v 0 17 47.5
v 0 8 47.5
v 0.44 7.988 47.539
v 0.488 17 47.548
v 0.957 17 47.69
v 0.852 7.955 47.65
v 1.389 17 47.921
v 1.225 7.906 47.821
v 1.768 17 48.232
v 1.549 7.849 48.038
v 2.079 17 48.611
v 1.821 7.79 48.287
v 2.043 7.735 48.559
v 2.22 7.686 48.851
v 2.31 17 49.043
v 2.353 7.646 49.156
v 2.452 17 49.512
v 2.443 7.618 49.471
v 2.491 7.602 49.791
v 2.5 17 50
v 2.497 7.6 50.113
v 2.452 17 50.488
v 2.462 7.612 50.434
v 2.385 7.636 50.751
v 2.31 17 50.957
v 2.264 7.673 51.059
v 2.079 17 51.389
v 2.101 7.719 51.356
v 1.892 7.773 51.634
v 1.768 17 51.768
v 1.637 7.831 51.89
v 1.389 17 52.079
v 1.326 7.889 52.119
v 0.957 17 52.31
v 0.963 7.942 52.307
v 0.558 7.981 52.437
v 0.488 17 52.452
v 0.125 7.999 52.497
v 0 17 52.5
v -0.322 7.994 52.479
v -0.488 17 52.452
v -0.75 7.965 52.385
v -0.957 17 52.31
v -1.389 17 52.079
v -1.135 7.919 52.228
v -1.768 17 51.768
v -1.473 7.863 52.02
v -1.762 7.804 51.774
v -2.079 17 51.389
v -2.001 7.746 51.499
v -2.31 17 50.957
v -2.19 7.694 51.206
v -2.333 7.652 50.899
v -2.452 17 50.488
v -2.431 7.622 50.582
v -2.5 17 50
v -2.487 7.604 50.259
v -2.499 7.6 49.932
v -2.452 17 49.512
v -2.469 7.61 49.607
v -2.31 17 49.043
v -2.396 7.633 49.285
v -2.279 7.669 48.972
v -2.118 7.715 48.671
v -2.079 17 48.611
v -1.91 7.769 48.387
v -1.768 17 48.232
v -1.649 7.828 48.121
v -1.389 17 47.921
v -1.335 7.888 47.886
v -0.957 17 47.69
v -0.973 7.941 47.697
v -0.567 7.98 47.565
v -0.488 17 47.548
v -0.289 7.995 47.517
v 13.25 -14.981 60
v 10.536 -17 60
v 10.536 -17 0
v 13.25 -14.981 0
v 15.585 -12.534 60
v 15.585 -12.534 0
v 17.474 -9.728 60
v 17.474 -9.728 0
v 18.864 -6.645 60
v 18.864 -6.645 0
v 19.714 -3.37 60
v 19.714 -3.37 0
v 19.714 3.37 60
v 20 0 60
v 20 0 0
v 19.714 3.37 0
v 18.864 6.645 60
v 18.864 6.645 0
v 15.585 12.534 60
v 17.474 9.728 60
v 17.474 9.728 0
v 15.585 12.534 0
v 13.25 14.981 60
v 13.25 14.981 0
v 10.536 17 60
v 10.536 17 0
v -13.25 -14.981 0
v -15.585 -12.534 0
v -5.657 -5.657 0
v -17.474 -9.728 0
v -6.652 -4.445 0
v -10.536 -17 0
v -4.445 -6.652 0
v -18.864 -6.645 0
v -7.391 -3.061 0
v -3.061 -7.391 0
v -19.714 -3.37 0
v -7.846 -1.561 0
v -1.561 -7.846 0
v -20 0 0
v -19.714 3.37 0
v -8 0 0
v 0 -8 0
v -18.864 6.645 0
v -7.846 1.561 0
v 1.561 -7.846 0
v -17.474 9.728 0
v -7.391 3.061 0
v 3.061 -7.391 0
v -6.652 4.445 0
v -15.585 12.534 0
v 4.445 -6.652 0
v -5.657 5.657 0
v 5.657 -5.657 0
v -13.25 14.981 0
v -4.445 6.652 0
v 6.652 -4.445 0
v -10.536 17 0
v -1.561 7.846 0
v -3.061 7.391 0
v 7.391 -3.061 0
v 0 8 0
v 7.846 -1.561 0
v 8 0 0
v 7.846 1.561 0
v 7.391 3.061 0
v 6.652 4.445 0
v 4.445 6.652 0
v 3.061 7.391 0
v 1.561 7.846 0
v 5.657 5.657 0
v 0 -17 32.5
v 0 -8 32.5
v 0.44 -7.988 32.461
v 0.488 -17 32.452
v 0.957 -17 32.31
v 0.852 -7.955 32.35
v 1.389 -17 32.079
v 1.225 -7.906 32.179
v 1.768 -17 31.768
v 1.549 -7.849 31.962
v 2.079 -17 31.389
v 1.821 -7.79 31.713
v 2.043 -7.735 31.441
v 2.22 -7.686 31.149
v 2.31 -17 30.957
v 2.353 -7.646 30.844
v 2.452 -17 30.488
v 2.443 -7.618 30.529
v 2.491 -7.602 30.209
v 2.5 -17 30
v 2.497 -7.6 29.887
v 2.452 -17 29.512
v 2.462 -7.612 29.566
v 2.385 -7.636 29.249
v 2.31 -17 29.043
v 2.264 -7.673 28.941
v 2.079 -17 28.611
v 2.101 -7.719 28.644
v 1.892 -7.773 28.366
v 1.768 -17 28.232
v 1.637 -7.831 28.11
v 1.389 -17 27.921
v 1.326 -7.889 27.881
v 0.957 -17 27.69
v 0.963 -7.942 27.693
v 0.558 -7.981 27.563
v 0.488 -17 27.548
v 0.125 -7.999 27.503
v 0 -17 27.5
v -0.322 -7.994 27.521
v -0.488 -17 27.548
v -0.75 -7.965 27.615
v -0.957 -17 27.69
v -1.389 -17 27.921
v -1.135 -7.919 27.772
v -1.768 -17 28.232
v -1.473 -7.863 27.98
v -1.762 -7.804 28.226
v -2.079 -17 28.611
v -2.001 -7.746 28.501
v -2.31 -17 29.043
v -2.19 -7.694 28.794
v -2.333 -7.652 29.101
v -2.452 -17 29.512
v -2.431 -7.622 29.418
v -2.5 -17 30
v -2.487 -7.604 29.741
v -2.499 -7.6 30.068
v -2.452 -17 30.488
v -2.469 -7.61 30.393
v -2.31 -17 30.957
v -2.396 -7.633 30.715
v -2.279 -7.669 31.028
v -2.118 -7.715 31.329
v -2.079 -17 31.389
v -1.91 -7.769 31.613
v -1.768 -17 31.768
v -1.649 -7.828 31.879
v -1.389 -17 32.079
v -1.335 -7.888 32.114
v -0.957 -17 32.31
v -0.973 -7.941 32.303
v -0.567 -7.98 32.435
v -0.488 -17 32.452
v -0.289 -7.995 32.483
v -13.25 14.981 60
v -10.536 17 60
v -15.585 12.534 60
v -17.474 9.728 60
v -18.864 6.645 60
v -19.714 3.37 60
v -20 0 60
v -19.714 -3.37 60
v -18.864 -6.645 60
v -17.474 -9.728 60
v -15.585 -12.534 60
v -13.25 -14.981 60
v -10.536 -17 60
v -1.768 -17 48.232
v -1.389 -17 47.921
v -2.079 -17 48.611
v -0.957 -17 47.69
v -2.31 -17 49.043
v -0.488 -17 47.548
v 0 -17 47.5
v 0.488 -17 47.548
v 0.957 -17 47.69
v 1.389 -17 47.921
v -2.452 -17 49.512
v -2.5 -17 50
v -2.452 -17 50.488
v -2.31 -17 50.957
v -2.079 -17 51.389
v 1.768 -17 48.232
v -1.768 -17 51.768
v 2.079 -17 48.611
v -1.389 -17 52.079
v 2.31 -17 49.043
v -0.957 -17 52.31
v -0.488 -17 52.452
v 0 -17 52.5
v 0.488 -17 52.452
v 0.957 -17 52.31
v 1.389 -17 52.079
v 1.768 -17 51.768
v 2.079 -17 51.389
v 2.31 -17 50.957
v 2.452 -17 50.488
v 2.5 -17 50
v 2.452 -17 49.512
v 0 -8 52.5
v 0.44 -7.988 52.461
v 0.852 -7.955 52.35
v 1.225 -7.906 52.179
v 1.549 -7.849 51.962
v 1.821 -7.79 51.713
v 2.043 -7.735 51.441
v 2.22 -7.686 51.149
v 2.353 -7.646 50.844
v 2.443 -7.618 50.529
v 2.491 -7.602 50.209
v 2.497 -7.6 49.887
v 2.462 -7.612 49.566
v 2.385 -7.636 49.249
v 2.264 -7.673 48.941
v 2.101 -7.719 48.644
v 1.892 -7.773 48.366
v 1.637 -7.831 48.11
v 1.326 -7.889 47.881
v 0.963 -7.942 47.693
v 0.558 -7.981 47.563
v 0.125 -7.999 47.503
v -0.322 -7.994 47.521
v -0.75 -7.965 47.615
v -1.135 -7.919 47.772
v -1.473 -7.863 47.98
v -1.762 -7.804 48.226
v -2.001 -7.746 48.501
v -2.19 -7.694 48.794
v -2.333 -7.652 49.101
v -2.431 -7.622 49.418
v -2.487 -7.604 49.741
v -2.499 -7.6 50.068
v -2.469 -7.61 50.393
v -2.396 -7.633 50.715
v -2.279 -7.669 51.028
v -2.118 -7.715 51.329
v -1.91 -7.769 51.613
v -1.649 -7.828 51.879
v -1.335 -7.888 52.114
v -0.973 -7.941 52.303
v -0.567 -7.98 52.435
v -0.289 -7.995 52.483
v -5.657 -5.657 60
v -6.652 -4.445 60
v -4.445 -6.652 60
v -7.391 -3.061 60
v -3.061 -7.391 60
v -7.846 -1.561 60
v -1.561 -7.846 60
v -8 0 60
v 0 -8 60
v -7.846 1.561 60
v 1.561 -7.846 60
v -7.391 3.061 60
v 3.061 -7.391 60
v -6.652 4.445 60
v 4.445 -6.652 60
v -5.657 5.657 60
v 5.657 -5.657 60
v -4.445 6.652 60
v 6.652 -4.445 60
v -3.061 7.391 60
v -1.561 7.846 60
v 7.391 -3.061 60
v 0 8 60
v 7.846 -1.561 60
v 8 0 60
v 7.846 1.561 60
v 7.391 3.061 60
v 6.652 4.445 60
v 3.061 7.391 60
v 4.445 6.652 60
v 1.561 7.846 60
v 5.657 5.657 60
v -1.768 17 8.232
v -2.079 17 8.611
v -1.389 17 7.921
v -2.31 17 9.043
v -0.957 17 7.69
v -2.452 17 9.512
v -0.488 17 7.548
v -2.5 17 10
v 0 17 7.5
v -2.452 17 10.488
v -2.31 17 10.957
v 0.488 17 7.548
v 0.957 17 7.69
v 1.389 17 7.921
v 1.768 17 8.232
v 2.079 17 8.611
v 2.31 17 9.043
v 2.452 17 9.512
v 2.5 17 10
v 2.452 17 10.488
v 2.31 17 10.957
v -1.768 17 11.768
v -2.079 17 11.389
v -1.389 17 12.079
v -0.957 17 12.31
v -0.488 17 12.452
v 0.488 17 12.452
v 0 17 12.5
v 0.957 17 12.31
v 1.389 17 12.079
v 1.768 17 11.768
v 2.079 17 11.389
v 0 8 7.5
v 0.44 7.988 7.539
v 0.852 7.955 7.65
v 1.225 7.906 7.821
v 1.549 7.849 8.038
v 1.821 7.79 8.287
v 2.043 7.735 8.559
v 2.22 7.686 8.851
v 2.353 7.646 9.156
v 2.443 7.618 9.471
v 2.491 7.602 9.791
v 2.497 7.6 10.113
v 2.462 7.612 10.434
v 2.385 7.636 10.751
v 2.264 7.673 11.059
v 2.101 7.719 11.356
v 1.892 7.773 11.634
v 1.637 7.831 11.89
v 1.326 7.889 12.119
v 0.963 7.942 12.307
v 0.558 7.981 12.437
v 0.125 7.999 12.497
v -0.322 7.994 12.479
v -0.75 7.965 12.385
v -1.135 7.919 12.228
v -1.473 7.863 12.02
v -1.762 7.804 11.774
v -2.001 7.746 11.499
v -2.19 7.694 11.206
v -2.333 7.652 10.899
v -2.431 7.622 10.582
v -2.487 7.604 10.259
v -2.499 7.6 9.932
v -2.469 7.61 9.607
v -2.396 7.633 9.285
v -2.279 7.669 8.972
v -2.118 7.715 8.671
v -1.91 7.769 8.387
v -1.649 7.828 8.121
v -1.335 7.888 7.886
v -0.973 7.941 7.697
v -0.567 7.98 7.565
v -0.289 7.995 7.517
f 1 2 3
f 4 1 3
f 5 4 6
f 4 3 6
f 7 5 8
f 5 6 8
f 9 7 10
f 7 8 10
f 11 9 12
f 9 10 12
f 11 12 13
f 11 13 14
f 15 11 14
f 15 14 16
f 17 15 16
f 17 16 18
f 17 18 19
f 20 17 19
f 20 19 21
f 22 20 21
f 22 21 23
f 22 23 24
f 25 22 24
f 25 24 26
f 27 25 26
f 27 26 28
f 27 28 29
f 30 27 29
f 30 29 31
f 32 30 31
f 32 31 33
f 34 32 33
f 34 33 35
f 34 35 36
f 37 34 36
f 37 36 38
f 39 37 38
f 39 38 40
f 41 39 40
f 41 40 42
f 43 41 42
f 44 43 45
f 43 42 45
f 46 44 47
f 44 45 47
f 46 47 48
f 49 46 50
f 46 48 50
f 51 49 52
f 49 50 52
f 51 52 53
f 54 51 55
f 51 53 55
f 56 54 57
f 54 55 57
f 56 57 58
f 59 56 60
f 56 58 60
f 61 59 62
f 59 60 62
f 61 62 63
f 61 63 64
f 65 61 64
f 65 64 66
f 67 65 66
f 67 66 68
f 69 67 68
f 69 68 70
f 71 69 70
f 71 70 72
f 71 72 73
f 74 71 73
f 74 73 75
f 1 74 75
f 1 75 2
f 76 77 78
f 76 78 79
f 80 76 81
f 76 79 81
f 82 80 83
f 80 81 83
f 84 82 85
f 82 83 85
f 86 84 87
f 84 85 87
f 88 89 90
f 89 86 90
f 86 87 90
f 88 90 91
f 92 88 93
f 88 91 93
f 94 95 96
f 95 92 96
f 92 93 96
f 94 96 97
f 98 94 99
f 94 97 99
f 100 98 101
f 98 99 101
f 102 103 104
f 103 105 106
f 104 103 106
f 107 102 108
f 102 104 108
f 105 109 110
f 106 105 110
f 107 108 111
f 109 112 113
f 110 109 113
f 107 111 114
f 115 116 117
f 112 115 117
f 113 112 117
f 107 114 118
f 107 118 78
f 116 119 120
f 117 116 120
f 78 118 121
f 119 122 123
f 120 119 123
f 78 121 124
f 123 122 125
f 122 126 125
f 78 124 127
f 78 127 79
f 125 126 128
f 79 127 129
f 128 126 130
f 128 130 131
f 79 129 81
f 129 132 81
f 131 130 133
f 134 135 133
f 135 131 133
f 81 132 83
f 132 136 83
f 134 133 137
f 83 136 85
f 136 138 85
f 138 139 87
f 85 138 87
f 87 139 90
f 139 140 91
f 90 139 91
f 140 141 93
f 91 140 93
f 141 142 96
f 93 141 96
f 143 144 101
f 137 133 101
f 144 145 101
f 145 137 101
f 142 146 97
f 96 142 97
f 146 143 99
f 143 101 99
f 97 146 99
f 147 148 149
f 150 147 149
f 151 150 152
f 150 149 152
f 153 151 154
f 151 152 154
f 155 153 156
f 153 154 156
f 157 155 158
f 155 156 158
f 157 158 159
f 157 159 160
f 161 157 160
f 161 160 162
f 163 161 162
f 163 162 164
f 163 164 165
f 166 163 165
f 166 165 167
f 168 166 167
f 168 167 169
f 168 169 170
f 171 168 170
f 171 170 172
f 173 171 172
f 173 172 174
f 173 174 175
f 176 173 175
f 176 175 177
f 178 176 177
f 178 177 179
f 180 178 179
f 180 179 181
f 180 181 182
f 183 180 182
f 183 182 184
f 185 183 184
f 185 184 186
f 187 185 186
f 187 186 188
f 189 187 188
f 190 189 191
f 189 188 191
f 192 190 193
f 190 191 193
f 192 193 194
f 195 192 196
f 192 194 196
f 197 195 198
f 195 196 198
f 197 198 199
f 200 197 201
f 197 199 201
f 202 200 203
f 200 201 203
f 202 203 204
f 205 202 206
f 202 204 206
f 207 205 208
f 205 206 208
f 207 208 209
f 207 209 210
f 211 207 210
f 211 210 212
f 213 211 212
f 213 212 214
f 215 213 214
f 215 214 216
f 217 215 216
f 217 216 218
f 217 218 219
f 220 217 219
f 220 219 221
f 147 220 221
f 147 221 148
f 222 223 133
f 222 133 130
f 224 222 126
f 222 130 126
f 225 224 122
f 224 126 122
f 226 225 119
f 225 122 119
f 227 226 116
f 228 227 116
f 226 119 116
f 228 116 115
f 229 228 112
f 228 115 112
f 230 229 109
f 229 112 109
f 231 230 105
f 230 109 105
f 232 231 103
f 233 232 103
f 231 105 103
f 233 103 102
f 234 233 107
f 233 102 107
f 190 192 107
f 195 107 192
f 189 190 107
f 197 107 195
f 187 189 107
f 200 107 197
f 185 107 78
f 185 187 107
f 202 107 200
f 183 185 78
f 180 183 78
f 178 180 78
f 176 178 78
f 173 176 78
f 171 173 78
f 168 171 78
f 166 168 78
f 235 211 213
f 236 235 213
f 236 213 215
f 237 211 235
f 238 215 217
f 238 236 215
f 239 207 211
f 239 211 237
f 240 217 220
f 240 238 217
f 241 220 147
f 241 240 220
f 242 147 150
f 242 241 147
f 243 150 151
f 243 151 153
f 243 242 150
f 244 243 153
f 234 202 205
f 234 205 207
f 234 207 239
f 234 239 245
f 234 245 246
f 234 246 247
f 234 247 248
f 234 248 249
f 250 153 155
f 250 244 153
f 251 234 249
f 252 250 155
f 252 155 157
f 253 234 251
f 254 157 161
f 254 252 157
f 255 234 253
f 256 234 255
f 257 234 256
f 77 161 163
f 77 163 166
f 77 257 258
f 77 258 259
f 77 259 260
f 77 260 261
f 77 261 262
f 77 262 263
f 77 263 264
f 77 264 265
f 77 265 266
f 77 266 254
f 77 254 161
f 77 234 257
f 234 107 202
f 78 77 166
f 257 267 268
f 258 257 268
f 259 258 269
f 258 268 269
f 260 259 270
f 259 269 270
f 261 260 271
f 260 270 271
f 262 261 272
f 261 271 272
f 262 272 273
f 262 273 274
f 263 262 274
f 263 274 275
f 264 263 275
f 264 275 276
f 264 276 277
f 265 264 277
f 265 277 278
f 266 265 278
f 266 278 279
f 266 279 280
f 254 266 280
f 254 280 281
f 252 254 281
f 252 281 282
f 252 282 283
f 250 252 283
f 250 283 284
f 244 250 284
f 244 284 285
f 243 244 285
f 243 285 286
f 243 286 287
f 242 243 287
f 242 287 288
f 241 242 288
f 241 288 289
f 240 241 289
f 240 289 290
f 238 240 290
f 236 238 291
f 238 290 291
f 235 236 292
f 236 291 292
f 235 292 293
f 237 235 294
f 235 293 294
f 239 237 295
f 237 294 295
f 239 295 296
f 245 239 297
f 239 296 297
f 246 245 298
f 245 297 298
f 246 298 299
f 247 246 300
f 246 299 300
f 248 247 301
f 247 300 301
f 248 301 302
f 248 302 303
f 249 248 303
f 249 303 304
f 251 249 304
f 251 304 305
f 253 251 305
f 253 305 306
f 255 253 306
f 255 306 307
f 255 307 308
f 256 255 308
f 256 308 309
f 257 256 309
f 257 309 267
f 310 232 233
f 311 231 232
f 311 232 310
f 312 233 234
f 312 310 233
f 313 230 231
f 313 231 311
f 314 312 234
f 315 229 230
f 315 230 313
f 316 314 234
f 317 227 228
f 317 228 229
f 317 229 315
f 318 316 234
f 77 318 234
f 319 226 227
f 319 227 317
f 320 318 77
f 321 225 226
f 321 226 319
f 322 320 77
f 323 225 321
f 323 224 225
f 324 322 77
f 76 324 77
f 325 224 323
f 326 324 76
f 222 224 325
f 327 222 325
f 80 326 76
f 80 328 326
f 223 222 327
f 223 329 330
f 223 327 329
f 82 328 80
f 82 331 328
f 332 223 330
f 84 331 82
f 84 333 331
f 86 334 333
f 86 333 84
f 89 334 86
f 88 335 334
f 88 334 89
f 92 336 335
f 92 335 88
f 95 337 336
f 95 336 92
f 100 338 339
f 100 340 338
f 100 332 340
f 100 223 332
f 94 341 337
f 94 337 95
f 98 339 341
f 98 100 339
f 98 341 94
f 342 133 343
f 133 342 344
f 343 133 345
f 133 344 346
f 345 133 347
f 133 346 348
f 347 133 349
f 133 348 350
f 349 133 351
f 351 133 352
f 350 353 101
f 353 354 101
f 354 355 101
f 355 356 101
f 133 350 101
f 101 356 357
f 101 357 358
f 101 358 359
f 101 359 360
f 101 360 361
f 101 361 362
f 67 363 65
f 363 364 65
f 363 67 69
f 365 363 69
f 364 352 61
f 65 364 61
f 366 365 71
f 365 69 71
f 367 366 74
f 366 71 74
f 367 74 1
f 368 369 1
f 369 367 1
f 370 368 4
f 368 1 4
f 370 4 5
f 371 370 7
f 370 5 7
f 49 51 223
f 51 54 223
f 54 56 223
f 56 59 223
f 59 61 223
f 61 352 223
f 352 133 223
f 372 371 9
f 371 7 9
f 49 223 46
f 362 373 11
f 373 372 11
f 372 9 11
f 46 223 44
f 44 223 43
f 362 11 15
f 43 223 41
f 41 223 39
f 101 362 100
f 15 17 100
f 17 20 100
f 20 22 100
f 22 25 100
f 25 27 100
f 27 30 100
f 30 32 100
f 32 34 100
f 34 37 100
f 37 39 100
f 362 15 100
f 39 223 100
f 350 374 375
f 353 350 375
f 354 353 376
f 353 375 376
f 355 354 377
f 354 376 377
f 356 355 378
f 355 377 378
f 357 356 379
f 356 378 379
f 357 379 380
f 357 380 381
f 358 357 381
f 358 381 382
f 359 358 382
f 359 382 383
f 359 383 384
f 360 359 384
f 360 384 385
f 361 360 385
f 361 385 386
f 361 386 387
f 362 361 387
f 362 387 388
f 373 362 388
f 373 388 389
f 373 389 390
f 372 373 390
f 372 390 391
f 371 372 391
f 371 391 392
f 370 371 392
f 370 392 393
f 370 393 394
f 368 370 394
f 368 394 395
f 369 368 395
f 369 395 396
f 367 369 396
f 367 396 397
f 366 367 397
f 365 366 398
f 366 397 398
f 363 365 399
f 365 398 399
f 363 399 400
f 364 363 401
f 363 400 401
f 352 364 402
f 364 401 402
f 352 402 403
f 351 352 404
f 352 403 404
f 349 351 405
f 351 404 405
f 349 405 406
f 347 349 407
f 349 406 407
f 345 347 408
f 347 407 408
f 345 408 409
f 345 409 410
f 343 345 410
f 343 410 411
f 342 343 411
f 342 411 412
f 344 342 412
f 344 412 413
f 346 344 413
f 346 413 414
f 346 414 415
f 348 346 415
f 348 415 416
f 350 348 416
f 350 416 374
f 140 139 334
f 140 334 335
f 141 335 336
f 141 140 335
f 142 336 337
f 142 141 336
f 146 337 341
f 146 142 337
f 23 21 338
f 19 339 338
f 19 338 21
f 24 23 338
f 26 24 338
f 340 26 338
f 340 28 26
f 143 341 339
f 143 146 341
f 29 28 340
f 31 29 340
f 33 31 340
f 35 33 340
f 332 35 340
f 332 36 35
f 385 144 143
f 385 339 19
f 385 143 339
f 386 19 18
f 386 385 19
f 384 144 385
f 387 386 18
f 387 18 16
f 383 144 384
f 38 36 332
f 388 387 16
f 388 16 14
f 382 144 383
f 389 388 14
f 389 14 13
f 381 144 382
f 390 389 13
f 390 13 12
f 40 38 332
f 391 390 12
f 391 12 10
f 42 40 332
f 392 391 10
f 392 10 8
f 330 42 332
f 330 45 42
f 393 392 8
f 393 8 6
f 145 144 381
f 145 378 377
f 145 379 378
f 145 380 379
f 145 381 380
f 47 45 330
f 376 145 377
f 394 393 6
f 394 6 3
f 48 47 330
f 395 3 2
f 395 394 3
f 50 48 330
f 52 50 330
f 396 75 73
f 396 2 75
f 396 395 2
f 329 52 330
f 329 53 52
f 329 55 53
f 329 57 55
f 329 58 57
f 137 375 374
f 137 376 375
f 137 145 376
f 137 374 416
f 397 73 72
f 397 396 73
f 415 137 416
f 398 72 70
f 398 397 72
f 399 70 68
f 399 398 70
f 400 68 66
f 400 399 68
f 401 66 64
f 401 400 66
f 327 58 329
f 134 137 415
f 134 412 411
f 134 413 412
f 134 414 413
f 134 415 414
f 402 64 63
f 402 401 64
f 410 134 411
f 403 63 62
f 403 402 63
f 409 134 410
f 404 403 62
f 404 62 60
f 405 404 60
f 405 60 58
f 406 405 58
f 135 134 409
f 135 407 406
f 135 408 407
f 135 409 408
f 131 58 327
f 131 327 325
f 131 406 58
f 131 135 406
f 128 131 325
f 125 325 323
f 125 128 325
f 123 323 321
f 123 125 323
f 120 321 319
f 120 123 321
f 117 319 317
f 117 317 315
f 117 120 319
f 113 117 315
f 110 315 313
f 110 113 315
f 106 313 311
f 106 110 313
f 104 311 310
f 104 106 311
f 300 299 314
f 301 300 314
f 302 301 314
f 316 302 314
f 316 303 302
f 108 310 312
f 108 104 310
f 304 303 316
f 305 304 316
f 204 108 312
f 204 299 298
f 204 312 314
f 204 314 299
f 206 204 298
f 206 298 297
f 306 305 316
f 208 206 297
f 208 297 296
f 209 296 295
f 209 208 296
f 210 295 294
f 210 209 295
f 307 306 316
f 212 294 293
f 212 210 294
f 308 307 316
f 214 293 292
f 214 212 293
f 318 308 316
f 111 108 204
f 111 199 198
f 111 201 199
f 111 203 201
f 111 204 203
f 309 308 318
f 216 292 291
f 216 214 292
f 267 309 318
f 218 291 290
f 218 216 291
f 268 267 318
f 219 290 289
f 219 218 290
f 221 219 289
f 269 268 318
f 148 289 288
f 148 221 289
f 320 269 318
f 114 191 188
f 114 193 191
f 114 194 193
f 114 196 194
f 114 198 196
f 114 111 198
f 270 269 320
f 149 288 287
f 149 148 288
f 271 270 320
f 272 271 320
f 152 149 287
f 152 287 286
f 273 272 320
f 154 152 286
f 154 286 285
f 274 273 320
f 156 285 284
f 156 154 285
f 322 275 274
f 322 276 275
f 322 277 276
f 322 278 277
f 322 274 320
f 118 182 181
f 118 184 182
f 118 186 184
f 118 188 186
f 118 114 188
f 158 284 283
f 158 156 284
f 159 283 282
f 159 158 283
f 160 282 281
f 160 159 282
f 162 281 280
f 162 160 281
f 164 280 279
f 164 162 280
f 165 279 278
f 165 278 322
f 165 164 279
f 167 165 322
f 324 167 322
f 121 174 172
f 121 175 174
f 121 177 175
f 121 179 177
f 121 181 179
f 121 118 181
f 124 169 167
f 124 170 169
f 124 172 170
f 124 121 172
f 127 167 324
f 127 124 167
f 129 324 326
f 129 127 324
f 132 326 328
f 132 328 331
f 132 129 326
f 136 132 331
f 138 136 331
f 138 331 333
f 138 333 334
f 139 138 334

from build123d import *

# Parameters (mm, degrees)
ESQUISSE1_R             = 20
ESQUISSE1_R_2           = 8
BOSS_EXTRU_1_DEPTH      = 60
ESQUISSE2_W             = 40
ESQUISSE2_H             = 4.835178206
ESQUISSE2_W_2           = 44.689434038
ESQUISSE2_H_2           = 5.086258347
ENL_V_MAT_EXTRU_1_DEPTH = 60
TROU_TARAUD_M61_D       = 5
TROU_TARAUD_M61_DEPTH   = 13
TROU_TARAUD_M61_TIP     = 1.502151548
TROU_TARAUD_M62_D       = 5
TROU_TARAUD_M62_DEPTH   = 15
TROU_TARAUD_M62_TIP     = 1.502151548


with BuildPart() as part:
    # Esquisse1 → Boss.-Extru.1 (new body)
    with BuildSketch(Plane.XY):
        Circle(ESQUISSE1_R)
        Circle(ESQUISSE1_R_2, mode=Mode.SUBTRACT)
    extrude(amount=BOSS_EXTRU_1_DEPTH)

    # Esquisse2 → Enlèv. mat.-Extru.1 (cut)
    with BuildSketch(Plane.XY.offset(60)):
        with Locations((4.791370724, 19.417589103)):
            Rectangle(ESQUISSE2_W, ESQUISSE2_H)
        with Locations((-4.250423756, -19.543129173)):
            Rectangle(ESQUISSE2_W_2, ESQUISSE2_H_2)
    extrude(amount=-ENL_V_MAT_EXTRU_1_DEPTH, mode=Mode.SUBTRACT)

    # Trou taraudé M61
    with Locations(Plane(origin=(0, 17, 50), x_dir=(0, 0, 1), z_dir=(0, 1, 0))):
        with Locations((0, 0), (-40, 0)):
            Hole(TROU_TARAUD_M61_D / 2, depth=TROU_TARAUD_M61_DEPTH)
            with Locations((0, 0, -(TROU_TARAUD_M61_DEPTH + TROU_TARAUD_M61_TIP / 2))):  # 118° drill point
                Cone(0, TROU_TARAUD_M61_D / 2, TROU_TARAUD_M61_TIP, mode=Mode.SUBTRACT)

    # Trou taraudé M62
    with Locations(Plane(origin=(0, -17, 50), x_dir=(0, 0, -1), z_dir=(0, -1, 0))):
        with Locations((0, 0), (20, 0)):
            Hole(TROU_TARAUD_M62_D / 2, depth=TROU_TARAUD_M62_DEPTH)
            with Locations((0, 0, -(TROU_TARAUD_M62_DEPTH + TROU_TARAUD_M62_TIP / 2))):  # 118° drill point
                Cone(0, TROU_TARAUD_M62_D / 2, TROU_TARAUD_M62_TIP, mode=Mode.SUBTRACT)


solid = part.part
